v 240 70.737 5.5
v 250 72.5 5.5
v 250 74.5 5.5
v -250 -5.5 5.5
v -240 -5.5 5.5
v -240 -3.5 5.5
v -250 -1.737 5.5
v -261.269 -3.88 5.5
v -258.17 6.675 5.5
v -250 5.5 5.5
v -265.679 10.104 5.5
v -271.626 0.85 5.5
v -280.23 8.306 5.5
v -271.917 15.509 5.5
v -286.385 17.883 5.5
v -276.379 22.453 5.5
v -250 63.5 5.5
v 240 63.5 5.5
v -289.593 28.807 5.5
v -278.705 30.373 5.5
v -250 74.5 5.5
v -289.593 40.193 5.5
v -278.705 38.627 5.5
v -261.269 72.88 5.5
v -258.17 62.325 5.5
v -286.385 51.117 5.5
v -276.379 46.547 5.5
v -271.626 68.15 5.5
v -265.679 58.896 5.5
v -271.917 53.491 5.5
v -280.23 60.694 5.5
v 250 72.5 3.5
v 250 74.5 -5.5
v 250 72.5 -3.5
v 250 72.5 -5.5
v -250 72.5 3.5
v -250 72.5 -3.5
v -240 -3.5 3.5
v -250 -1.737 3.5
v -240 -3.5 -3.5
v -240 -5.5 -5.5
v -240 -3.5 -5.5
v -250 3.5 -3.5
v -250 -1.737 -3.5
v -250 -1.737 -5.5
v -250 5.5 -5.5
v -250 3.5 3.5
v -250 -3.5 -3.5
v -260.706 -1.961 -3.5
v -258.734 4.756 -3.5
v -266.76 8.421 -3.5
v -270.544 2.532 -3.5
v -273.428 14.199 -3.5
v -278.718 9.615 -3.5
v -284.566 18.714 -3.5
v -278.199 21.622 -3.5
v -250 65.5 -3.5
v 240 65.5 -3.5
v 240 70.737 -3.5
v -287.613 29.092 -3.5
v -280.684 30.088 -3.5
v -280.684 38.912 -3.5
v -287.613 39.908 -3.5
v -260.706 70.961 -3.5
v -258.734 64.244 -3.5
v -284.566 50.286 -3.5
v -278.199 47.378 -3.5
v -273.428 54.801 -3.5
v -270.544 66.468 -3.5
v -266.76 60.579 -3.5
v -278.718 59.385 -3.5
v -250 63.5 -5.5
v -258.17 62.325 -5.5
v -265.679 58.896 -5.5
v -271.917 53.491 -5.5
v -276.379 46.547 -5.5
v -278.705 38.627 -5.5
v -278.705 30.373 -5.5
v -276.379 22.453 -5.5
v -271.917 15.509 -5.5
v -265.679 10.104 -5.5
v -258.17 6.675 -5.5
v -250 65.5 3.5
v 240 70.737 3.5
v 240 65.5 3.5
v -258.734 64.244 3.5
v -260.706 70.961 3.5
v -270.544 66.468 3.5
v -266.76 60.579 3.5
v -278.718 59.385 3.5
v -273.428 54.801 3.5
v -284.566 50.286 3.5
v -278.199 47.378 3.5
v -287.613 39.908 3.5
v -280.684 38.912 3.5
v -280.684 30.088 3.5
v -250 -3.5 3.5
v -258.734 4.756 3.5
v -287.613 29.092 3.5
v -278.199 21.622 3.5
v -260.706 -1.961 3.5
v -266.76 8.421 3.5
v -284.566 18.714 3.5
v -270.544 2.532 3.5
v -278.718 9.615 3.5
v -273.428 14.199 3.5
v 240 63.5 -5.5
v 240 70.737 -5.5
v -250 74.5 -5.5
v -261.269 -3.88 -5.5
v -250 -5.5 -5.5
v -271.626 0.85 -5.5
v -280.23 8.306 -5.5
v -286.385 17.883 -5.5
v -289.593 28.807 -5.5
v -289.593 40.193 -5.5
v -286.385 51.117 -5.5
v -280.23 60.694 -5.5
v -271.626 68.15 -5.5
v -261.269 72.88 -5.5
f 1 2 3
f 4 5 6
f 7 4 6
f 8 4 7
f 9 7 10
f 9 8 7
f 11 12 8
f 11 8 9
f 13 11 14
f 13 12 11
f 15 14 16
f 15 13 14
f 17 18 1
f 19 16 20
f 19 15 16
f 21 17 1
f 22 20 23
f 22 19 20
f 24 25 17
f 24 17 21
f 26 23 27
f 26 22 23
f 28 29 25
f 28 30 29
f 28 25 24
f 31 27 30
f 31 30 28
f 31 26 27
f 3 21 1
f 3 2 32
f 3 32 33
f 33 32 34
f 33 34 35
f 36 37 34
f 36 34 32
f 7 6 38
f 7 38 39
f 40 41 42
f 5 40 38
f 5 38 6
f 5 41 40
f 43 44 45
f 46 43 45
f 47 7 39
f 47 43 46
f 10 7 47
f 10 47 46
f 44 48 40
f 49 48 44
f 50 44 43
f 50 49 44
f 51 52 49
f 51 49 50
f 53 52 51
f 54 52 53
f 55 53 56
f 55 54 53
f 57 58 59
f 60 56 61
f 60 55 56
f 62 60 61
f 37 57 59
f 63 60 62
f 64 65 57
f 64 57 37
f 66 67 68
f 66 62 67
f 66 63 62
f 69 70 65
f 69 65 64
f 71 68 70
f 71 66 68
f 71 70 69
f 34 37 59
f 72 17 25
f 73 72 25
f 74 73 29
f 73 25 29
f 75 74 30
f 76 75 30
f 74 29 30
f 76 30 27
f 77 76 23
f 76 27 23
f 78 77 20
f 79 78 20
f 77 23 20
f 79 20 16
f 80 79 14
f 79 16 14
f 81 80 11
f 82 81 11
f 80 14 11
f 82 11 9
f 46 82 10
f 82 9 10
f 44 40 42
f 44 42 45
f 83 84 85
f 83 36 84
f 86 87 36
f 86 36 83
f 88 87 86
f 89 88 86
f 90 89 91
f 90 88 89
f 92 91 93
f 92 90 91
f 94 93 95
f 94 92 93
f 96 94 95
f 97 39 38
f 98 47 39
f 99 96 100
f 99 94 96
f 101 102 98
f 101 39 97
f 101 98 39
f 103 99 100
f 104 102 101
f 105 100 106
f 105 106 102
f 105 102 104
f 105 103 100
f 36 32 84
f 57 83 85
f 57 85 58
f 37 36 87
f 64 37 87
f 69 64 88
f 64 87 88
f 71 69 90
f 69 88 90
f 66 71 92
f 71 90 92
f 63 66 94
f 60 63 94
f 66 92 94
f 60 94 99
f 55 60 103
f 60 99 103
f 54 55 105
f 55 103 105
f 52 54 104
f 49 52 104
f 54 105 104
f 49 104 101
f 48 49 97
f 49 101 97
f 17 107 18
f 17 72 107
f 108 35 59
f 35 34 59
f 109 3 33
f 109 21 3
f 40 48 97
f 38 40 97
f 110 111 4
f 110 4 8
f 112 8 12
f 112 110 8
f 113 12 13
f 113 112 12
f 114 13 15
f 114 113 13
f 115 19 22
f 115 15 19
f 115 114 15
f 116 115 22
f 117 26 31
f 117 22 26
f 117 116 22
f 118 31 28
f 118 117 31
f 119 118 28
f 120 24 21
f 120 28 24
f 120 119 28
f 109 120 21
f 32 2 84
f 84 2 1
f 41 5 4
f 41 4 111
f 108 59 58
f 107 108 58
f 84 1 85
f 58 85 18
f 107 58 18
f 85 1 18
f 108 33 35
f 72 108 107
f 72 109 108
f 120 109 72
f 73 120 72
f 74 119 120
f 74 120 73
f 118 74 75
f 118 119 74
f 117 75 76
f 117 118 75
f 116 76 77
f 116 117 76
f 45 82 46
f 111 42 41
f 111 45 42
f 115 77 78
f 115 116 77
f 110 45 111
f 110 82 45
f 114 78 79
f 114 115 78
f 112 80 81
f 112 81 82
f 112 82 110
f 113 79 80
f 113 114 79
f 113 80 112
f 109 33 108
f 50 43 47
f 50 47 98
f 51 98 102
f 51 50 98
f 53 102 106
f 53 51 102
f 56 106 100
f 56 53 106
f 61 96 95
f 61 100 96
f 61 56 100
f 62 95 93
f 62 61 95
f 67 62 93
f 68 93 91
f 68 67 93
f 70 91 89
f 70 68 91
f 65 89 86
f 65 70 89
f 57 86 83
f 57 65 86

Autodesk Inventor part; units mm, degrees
ref_plane "YZ Plane" through (0, 0, 0) normal (1, 0, 0) x (0, 1, 0)
ref_plane "XZ Plane" through (0, 0, 0) normal (0, 1, 0) x (-1, 0, 0)
sketch "Sketch1" plane through (0, 0, 0) normal (0, 0, 1) x (1, 0, 0)
  line L0 (250, 69) -> (-250, 69)
  line L1 (-53.0332, 0) -> (53.0332, 0) construction
  arc A0 (-250, 69) -> (-250, 0) centre (-250, 34.5) ccw
  line L2 (-250, 0) -> (-240, 0)
  point P0 (0, 0)
  point P1 (0, 69)
  point P2 (0, 0)
  dimension "d0" = 500
  dimension "d1" = 69
  dimension "d25" = 10
ref_plane "Work Plane1" through (250, 69, 0) normal (-1, 0, 0) x (0, -1, 0)
sketch "Sketch2" plane through (250, 69, 0) normal (-1, 0, 0) x (0, -1, 0)
  line L0 (3.5, 3.5) -> (-3.5, 3.5)
  line L1 (-3.5, 3.5) -> (-3.5, -3.5)
  line L2 (-3.5, -3.5) -> (3.5, -3.5)
  line L3 (3.5, -3.5) -> (3.5, 3.5)
  line L4 (-5.5, 5.5) -> (5.5, 5.5)
  line L5 (5.5, 5.5) -> (5.5, -5.5)
  line L6 (5.5, -5.5) -> (-5.5, -5.5)
  line L7 (-5.5, -5.5) -> (-5.5, 5.5)
  point P0 (69, 0)
  point P1 (0, 3.5)
  point P2 (3.5, 0)
  point P3 (0, 0)
  point P4 (0, 0)
  point P5 (0, 0)
  dimension "d2" = 7
  dimension "d3" = 7
  dimension "d4" = 2
sweep "Sweep1" add profiles "Sketch2" path "Sketch1"
sketch "Sketch3" plane through (250, 63.5, 5.5) normal (0, 0, 1) x (1, 0, 0)
  line L0 (0, 9) -> (-500, 9) projected
  line L1 (0, 9) -> (-10, 7.2367)
  line L2 (-10, 7.2367) -> (-10, 0)
  line L3 (0, 0) -> (-500, 0) projected
  line L4 (0, 0) -> (-500, 0) projected
  line L5 (0, 0) -> (0, 11) projected
  line L6 (-500, -67) -> (-490, -67) projected
  line L7 (-490, -67) -> (-500, -65.2367)
  line L8 (-500, -65.2367) -> (-500, -58)
  line L9 (-490, -58) -> (-490, -69) projected
  line L10 (-500, -58) -> (-490, -58) projected
  dimension "d29" = 100
  dimension "d30" = 10
  dimension "d33" = 100
  dimension "d34" = 10
extrude "Extrusion1" cut sketch "Sketch3" against normal through all
properties part number "0008-10-1026 wire chain Y"
